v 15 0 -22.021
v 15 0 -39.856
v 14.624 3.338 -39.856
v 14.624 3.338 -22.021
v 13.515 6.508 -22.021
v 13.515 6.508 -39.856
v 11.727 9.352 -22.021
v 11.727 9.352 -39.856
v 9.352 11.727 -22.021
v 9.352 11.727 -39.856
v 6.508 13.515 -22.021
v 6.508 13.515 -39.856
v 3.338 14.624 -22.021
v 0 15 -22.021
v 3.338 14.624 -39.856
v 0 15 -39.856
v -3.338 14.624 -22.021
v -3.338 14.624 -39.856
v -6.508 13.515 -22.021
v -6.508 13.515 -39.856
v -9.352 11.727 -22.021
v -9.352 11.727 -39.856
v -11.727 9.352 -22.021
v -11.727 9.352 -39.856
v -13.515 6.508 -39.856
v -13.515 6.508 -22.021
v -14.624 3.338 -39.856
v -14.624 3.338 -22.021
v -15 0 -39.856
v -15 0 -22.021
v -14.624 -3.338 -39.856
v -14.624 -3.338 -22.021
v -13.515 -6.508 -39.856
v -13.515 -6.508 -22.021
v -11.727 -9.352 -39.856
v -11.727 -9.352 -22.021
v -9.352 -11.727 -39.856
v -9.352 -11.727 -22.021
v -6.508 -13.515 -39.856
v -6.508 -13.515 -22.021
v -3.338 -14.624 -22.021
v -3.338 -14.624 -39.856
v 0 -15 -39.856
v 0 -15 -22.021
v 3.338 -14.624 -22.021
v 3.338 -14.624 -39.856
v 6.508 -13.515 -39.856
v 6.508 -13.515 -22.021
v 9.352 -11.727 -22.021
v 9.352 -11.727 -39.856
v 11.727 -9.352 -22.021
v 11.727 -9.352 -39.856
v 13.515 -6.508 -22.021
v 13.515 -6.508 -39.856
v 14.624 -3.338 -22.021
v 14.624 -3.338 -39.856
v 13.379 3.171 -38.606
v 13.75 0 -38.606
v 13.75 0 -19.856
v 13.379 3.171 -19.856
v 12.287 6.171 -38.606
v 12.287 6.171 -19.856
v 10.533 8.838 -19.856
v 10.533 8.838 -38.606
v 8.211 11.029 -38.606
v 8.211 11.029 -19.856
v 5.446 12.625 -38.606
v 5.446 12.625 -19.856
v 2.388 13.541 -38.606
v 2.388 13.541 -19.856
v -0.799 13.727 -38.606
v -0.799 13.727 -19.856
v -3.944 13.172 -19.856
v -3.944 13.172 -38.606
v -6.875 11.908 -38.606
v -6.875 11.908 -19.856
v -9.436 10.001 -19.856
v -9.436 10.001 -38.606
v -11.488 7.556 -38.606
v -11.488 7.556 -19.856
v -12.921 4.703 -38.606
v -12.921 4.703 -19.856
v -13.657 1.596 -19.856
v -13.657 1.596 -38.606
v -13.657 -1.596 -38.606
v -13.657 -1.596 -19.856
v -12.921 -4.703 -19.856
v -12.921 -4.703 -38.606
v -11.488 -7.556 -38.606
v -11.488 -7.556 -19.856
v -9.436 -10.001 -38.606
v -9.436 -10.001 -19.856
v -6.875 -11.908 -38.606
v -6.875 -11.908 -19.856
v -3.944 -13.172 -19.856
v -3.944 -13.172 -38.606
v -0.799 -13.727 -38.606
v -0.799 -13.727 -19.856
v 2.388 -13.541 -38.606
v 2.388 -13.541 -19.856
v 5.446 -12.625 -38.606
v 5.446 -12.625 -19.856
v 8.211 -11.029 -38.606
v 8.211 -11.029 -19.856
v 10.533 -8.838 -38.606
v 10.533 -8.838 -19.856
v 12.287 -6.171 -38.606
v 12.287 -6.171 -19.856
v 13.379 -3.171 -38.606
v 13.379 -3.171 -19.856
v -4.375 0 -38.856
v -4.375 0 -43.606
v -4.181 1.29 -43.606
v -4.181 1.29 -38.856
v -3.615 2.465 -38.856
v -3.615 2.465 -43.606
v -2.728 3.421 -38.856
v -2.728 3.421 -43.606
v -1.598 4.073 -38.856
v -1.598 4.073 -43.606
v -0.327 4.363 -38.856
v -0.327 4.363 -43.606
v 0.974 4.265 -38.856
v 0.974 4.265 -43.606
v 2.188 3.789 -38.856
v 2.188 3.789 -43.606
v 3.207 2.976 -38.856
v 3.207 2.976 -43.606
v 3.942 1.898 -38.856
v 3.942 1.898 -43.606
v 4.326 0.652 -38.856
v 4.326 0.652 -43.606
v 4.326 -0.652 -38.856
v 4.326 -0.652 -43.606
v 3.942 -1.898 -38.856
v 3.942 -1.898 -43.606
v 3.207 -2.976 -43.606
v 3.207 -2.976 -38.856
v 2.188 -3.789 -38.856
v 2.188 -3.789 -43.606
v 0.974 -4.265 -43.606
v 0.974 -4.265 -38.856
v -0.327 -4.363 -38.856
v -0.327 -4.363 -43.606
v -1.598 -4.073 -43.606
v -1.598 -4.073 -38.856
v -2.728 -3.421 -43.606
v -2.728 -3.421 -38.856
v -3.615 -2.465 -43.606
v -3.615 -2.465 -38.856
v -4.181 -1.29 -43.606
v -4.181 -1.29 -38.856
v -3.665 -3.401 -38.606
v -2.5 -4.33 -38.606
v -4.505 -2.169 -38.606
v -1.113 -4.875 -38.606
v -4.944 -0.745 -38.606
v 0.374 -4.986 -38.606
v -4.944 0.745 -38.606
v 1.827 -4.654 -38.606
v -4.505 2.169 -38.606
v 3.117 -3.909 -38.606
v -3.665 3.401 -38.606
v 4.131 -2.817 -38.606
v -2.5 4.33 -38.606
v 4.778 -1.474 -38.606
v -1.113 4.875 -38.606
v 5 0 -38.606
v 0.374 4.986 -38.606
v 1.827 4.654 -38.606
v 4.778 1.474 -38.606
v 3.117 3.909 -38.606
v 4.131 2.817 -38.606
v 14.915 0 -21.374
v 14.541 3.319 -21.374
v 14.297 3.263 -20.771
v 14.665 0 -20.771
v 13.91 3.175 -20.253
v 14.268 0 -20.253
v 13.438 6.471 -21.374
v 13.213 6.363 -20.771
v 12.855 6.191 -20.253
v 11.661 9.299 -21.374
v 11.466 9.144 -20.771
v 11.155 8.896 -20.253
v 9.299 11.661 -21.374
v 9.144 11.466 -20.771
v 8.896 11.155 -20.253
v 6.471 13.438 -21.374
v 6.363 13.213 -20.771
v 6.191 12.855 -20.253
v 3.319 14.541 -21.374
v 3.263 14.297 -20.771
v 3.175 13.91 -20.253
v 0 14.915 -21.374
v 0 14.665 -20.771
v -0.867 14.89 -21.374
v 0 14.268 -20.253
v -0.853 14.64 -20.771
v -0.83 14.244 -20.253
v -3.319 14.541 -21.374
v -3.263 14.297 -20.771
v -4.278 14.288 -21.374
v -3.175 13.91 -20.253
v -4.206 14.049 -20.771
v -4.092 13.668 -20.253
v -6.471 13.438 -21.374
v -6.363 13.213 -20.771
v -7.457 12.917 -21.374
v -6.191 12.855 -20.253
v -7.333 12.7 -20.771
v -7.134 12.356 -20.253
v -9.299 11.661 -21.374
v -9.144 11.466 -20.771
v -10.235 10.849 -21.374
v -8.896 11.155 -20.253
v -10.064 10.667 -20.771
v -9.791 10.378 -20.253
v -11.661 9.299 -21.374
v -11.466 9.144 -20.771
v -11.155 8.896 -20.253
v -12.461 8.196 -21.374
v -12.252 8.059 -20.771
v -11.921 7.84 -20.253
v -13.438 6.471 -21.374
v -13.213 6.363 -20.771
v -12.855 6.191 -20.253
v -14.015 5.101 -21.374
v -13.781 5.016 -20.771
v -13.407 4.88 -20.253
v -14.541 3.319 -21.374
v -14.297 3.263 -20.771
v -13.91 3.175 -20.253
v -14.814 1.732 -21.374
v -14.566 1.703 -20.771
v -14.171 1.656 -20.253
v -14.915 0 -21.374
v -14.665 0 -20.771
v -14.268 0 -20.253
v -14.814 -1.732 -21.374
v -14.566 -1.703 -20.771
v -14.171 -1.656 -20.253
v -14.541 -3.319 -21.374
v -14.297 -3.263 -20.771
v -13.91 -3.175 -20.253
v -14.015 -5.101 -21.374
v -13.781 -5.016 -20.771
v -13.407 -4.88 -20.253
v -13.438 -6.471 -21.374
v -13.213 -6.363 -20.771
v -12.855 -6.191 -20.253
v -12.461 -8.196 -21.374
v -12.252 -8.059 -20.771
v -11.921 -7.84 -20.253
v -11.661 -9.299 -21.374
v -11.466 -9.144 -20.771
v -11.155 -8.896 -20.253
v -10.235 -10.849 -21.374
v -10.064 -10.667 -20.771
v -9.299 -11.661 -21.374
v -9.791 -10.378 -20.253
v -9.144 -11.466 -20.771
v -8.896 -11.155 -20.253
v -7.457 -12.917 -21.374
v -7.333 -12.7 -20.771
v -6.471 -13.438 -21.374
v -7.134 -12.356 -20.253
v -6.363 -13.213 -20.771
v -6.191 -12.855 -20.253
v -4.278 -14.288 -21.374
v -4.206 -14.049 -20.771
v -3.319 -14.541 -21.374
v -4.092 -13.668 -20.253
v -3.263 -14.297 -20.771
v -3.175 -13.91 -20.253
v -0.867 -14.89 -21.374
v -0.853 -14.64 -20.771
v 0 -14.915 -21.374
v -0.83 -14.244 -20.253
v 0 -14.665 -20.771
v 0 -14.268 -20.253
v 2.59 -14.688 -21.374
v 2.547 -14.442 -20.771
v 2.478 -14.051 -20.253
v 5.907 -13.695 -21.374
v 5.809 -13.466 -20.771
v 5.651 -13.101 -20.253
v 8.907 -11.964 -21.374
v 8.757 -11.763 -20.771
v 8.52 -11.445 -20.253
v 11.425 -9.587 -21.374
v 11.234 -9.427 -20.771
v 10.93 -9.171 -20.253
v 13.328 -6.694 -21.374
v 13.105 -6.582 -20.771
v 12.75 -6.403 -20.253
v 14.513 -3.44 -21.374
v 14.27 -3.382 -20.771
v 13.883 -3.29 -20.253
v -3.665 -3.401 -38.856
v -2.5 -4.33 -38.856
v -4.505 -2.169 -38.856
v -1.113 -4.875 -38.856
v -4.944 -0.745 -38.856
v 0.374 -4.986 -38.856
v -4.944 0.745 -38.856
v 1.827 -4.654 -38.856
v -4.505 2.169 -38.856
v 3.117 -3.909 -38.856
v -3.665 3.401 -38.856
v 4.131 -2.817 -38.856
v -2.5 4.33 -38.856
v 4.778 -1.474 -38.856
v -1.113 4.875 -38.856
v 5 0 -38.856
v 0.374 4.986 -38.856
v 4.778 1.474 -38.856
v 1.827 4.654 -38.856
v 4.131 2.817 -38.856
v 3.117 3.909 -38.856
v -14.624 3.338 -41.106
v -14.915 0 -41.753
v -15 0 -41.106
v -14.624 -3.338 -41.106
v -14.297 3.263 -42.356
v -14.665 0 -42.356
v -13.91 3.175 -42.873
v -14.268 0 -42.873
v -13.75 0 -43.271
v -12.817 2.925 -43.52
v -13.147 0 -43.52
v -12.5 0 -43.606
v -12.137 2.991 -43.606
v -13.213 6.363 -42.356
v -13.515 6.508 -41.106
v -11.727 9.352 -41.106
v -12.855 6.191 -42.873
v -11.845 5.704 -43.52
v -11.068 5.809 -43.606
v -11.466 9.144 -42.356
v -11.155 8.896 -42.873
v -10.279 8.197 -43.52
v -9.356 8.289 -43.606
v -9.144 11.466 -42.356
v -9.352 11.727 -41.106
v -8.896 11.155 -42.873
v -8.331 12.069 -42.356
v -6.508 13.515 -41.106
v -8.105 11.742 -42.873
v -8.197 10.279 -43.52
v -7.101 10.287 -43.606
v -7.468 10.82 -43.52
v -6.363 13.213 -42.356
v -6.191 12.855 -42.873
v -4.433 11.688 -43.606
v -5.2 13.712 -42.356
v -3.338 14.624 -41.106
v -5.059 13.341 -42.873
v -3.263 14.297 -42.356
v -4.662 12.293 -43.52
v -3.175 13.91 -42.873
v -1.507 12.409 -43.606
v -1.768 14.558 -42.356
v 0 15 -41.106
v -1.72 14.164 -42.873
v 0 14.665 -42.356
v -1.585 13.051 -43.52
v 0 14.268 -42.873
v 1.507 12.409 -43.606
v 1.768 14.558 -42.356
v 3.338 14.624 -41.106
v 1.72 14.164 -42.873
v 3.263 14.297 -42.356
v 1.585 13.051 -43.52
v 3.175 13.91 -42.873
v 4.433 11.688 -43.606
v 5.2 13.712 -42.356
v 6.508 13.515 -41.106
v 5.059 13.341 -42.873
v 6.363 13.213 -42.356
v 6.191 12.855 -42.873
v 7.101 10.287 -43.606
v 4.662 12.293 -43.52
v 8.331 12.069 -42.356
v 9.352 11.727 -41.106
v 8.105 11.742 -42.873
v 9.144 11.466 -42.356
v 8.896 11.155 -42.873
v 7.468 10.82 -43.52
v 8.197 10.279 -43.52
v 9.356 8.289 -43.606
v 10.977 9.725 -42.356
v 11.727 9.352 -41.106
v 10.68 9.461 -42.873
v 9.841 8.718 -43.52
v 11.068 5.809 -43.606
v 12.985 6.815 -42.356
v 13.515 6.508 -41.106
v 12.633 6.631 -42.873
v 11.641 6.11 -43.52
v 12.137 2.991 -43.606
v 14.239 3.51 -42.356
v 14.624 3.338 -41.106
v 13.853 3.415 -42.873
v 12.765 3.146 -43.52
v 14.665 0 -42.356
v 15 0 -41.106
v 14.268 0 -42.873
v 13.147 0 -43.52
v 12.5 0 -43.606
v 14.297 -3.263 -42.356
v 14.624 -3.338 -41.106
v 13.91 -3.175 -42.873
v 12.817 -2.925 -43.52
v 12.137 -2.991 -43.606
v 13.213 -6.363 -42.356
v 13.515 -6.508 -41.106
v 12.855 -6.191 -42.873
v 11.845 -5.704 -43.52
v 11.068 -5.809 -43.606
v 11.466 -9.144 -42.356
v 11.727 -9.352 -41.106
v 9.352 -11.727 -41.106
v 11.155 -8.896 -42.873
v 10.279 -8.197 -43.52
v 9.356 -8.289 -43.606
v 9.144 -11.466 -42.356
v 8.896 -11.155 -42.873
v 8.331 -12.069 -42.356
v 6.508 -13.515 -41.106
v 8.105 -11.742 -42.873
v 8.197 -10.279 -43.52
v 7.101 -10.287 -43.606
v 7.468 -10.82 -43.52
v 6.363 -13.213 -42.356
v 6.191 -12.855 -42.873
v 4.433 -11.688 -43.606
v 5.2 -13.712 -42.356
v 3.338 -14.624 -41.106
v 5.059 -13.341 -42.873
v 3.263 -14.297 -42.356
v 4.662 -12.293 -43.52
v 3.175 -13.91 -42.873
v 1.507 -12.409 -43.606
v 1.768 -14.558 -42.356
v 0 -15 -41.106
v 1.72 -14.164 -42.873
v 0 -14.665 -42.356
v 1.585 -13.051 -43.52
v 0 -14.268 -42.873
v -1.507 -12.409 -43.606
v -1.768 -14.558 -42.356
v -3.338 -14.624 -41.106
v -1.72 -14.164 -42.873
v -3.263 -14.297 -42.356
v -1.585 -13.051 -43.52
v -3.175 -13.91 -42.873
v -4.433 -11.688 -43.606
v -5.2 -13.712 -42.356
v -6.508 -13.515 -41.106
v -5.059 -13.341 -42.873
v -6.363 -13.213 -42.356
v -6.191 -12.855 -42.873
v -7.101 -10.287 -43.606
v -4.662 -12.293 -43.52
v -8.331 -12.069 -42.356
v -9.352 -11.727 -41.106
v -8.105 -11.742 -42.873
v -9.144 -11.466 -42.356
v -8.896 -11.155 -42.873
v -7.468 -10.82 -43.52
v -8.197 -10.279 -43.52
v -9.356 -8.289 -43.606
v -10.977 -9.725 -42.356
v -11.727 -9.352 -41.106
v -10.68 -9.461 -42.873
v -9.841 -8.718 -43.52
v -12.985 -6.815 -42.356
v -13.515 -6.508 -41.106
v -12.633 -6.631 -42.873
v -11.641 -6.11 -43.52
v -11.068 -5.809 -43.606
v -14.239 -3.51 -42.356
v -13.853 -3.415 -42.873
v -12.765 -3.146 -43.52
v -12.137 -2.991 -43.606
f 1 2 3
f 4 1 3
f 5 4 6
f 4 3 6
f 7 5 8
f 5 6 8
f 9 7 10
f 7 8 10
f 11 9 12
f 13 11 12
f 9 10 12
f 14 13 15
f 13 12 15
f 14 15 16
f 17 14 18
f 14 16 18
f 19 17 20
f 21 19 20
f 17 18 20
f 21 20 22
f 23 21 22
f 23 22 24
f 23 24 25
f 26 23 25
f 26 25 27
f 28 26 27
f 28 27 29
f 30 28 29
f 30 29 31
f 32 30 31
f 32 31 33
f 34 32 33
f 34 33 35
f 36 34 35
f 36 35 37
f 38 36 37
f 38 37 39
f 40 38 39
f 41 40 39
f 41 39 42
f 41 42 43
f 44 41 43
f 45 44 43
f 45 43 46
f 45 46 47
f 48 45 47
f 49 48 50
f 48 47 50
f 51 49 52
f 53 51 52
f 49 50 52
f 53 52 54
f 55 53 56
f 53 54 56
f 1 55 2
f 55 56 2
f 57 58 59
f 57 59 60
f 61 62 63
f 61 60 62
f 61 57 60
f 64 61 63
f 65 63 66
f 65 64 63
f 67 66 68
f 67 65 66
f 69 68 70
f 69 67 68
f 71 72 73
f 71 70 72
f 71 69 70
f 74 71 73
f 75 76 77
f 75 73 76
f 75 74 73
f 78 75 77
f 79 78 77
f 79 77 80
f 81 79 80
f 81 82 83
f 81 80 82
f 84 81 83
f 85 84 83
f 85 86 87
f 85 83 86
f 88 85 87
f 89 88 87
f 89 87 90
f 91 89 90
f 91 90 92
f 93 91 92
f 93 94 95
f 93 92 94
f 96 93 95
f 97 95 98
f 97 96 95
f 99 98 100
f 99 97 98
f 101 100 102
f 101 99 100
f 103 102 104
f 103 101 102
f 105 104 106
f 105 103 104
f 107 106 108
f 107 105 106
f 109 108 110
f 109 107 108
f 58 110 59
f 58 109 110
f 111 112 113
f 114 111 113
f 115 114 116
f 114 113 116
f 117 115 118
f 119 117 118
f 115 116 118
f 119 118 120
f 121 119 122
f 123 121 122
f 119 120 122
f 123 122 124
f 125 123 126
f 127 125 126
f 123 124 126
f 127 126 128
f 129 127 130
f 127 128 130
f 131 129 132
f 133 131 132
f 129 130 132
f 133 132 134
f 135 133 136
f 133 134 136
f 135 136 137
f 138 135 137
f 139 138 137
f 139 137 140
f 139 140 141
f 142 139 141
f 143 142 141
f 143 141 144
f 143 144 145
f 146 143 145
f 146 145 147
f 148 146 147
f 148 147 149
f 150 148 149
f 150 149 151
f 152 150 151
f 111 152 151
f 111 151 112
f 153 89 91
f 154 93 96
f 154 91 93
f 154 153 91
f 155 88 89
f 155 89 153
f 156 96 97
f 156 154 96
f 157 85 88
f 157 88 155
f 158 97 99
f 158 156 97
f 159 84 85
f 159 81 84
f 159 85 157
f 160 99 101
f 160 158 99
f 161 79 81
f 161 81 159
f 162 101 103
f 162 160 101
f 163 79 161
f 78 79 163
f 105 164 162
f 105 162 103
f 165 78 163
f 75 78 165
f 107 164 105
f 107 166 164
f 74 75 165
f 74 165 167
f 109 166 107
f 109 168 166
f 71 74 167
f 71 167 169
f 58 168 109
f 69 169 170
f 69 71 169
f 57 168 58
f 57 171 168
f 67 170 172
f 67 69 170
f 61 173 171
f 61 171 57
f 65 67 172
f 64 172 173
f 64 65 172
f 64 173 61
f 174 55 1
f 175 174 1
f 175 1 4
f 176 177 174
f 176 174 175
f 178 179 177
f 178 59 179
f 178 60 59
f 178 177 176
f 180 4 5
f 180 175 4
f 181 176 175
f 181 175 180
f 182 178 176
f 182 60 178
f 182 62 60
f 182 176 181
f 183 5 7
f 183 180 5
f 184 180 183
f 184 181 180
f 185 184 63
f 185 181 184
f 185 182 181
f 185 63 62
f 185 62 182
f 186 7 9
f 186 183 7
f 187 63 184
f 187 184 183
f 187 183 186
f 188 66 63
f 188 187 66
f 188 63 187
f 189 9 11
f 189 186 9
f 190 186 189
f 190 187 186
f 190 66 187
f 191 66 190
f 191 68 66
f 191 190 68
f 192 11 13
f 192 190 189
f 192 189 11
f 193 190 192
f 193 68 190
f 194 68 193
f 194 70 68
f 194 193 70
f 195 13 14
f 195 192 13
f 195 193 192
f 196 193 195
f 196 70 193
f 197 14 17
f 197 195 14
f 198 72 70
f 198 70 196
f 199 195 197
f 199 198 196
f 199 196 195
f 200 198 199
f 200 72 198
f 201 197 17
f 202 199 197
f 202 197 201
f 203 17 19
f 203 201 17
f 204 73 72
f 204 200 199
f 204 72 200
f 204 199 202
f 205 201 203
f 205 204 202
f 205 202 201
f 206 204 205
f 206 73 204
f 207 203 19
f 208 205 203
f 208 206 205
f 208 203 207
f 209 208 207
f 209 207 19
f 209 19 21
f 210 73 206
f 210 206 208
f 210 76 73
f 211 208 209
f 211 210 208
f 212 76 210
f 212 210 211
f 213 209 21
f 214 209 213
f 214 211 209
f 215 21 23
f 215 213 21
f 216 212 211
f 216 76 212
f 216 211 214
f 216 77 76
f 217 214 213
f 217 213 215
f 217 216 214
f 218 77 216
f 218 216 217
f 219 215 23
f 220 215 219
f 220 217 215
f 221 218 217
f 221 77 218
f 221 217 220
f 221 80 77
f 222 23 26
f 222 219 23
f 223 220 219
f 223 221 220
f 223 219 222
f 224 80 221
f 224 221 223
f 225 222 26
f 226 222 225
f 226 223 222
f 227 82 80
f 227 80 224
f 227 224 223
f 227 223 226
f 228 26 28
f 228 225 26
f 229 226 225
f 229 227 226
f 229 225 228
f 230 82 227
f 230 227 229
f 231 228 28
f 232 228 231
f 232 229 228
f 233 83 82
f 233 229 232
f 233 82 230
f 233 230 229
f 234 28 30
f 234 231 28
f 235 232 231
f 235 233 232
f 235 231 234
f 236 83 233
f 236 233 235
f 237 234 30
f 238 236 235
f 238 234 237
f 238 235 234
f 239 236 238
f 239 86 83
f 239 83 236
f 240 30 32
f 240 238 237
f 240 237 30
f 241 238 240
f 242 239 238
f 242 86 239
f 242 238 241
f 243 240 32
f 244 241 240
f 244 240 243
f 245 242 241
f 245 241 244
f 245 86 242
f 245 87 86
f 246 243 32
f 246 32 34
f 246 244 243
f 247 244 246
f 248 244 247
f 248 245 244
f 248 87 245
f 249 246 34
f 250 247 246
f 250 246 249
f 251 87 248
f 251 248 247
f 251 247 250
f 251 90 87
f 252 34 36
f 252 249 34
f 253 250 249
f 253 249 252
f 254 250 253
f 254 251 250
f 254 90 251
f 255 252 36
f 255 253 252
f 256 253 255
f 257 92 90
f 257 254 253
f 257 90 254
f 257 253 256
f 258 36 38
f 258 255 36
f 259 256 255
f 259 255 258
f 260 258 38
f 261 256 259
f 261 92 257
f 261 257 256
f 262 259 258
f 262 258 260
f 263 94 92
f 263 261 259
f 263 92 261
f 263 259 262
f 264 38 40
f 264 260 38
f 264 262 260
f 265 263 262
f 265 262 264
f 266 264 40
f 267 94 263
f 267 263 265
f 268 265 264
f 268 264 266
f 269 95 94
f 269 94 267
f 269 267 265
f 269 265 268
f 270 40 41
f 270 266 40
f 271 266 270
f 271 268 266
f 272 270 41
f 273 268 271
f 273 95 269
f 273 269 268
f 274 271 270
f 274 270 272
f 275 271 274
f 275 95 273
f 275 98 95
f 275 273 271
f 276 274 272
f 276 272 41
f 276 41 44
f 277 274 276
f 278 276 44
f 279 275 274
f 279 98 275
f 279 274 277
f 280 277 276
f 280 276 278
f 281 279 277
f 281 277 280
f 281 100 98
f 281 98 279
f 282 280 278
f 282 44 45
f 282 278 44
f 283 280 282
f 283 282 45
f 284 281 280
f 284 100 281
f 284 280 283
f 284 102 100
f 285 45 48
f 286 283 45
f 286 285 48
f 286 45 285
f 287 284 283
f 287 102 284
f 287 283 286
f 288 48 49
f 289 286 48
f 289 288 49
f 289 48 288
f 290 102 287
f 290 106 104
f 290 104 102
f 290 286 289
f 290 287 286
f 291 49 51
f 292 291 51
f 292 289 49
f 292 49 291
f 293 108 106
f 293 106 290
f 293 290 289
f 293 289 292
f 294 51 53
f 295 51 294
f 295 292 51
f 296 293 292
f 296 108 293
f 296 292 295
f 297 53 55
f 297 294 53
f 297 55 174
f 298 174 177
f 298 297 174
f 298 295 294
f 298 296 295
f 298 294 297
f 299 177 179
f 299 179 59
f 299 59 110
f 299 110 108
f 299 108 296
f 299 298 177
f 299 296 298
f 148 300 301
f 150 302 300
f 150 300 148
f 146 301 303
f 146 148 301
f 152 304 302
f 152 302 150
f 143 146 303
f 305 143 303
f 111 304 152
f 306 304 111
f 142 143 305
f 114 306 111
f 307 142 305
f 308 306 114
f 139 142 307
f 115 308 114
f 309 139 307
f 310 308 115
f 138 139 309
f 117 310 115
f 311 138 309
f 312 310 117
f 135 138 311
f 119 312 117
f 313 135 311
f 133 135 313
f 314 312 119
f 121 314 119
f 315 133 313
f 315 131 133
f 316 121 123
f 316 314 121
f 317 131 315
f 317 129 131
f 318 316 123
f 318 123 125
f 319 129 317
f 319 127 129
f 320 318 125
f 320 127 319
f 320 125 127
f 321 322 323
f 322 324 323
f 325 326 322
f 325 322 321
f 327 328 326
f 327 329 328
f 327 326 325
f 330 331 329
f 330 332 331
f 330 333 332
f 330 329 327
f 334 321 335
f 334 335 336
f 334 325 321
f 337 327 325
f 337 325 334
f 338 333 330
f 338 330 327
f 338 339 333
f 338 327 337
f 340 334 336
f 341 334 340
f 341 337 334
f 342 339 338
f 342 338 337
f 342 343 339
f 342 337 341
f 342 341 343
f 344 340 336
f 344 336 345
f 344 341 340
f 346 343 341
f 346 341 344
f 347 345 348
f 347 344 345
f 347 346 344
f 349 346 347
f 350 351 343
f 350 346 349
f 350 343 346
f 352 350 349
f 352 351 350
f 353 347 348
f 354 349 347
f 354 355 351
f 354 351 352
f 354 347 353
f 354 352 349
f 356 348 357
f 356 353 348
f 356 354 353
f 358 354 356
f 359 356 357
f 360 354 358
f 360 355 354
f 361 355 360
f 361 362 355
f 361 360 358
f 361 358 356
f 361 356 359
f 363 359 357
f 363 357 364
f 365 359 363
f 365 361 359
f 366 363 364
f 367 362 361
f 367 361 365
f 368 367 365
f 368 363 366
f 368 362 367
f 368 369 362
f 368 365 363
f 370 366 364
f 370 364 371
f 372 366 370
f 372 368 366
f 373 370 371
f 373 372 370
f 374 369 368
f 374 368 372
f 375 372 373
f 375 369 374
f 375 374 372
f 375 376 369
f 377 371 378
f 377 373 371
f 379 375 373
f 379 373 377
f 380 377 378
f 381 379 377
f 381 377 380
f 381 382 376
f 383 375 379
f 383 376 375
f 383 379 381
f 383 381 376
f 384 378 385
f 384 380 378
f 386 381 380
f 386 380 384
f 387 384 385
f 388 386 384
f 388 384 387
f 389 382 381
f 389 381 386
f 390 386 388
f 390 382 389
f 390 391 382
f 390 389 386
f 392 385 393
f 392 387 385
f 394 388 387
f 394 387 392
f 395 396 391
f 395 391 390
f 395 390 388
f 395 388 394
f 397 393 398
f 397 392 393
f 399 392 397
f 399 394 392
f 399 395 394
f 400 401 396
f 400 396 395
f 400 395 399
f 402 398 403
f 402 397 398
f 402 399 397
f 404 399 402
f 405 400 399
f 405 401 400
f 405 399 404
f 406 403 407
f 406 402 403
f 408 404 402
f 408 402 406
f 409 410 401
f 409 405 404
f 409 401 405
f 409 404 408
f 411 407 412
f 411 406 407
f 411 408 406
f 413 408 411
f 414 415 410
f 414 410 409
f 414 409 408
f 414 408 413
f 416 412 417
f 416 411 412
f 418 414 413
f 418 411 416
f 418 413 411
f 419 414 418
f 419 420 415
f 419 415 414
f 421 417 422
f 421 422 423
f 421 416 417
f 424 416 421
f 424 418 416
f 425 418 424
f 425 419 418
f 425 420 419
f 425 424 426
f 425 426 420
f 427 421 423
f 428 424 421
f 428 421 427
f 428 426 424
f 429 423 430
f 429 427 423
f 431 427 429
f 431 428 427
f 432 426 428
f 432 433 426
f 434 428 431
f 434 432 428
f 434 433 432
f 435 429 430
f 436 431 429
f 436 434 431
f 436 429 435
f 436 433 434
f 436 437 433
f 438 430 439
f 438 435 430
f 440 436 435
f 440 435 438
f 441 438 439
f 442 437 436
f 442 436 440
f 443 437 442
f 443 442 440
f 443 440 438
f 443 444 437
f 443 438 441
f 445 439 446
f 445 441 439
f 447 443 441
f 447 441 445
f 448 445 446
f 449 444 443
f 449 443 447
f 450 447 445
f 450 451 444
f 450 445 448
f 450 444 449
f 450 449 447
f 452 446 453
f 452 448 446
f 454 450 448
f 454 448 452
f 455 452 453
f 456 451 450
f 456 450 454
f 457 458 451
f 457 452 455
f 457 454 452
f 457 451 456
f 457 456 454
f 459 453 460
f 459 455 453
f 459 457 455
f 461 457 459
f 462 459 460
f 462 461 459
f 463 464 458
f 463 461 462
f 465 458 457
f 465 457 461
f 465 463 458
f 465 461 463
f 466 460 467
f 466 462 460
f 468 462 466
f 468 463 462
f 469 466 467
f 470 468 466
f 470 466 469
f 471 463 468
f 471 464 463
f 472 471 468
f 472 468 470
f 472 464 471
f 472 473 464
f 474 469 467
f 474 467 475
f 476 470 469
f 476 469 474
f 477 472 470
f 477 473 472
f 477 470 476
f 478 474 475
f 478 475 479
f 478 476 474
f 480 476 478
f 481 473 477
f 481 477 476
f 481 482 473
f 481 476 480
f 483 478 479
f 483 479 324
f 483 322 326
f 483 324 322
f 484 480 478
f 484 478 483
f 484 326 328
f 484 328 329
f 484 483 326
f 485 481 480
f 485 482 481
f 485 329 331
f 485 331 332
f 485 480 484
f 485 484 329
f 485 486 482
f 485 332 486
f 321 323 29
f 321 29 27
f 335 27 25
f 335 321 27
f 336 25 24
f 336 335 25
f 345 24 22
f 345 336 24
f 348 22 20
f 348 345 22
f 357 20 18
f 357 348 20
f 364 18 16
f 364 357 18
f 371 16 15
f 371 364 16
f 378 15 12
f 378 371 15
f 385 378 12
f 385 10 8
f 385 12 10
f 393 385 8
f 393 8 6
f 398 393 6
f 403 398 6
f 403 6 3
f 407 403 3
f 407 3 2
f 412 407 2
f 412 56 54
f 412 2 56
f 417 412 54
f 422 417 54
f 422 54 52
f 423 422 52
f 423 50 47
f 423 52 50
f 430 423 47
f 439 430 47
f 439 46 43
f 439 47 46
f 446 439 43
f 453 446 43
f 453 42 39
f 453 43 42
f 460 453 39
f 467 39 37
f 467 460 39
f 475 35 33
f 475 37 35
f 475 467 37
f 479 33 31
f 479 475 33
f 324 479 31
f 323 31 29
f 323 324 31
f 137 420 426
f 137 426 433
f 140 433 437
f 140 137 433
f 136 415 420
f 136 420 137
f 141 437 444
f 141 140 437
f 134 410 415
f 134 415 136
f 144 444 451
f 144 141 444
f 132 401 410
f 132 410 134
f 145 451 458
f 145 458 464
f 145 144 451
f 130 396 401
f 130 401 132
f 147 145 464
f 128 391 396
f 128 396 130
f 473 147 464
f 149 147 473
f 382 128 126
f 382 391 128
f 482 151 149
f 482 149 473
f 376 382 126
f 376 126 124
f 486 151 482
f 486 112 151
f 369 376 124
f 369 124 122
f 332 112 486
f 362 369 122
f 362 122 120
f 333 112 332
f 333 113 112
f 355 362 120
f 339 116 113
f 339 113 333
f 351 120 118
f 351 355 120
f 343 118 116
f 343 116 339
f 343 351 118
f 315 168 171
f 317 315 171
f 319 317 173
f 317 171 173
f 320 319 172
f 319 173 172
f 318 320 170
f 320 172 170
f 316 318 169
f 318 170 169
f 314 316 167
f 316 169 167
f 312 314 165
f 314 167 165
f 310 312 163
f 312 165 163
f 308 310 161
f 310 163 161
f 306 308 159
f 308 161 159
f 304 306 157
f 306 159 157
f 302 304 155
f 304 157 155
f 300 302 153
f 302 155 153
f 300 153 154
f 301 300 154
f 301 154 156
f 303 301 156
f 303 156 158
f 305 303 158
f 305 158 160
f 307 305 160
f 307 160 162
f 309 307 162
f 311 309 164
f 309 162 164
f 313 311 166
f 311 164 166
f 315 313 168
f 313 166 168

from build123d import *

# Parameters (mm, degrees)
BOSS_EXTRU_1_START      = -50
ESQUISSE1_R             = 60
BOSS_EXTRU_1_DEPTH      = 80
COQUE1_T                = -5
BOSS_EXTRU_2_START      = 15
ESQUISSE2_R             = 60
BOSS_EXTRU_2_DEPTH      = 15
ESQUISSE3_R             = 17.5
ENL_V_MAT_EXTRU_1_DEPTH = 20
ESQUISSE4_R             = 20
ENL_V_MAT_EXTRU_2_DEPTH = 1
CONG_1_R                = 10
CONG_2_R                = 10
ECHELLE1_SCALE          = 0.25


with BuildPart() as part:
    # Esquisse1 → Boss.-Extru.1 (new body)
    with BuildSketch(Plane.XY.offset(BOSS_EXTRU_1_START)):
        Circle(ESQUISSE1_R)
    extrude(amount=BOSS_EXTRU_1_DEPTH)

    # Coque1
    coque1_openings = [part.faces().sort_by_distance(p)[0] for p in [
        (0, 0, 30),
    ]]
    offset(amount=COQUE1_T, openings=coque1_openings, kind=Kind.INTERSECTION)

    # Esquisse2 → Boss.-Extru.2 (add)
    with BuildSketch(Plane(origin=(0, 0, -50), x_dir=(-1, 0, 0), z_dir=(0, 0, -1)).offset(BOSS_EXTRU_2_START)):
        Circle(ESQUISSE2_R)
    extrude(amount=-BOSS_EXTRU_2_DEPTH)

    # Esquisse3 → Enlèv. mat.-Extru.1 (cut)
    with BuildSketch(Plane(origin=(0, 0, -65), x_dir=(-1, 0, 0), z_dir=(0, 0, -1))):
        Circle(ESQUISSE3_R)
    extrude(amount=-ENL_V_MAT_EXTRU_1_DEPTH, mode=Mode.SUBTRACT)

    # Esquisse4 → Enlèv. mat.-Extru.2 (cut)
    with BuildSketch(Plane.XY.offset(-45)):
        Circle(ESQUISSE4_R)
    extrude(amount=-ENL_V_MAT_EXTRU_2_DEPTH, mode=Mode.SUBTRACT)

    # Congé1
    cong_1_edges = [part.edges().sort_by_distance(p)[0] for p in [
        (60, 0, -65),
    ]]
    fillet(cong_1_edges, radius=CONG_1_R)

    # Congé2
    # the kernel refuses this fillet: 10 mm, written as the material it takes off along each edge
    with BuildSketch(Plane(origin=(0, 0, 30), x_dir=(1, 0, 0), z_dir=(0, -1, 0))) as cong_2_piece_1:
        with BuildLine():
            CenterArc((50, -8.660254038), CONG_2_R, 0, 60)
            Line((55, 0), (55.1, 0.173205081))
            ThreePointArc((55.1, 0.173205081), (57.5, 0.2), (60, 0.2))
            Line((60, 0.2), (60.2, 0))
            Line((60.2, 0), (60.2, -8.660254038))
            Line((60.2, -8.660254038), (60, -8.660254038))
        make_face()
    revolve(axis=Axis((0, 0, 30), (0, 0, 1)), mode=Mode.SUBTRACT)


with BuildPart() as part_1:
    # Echelle1: scaled about (0, 0, -36.474067002)
    add(part.part.scale(ECHELLE1_SCALE).moved(Location((0, 0, -27.355550251))))


solid = part_1.part
